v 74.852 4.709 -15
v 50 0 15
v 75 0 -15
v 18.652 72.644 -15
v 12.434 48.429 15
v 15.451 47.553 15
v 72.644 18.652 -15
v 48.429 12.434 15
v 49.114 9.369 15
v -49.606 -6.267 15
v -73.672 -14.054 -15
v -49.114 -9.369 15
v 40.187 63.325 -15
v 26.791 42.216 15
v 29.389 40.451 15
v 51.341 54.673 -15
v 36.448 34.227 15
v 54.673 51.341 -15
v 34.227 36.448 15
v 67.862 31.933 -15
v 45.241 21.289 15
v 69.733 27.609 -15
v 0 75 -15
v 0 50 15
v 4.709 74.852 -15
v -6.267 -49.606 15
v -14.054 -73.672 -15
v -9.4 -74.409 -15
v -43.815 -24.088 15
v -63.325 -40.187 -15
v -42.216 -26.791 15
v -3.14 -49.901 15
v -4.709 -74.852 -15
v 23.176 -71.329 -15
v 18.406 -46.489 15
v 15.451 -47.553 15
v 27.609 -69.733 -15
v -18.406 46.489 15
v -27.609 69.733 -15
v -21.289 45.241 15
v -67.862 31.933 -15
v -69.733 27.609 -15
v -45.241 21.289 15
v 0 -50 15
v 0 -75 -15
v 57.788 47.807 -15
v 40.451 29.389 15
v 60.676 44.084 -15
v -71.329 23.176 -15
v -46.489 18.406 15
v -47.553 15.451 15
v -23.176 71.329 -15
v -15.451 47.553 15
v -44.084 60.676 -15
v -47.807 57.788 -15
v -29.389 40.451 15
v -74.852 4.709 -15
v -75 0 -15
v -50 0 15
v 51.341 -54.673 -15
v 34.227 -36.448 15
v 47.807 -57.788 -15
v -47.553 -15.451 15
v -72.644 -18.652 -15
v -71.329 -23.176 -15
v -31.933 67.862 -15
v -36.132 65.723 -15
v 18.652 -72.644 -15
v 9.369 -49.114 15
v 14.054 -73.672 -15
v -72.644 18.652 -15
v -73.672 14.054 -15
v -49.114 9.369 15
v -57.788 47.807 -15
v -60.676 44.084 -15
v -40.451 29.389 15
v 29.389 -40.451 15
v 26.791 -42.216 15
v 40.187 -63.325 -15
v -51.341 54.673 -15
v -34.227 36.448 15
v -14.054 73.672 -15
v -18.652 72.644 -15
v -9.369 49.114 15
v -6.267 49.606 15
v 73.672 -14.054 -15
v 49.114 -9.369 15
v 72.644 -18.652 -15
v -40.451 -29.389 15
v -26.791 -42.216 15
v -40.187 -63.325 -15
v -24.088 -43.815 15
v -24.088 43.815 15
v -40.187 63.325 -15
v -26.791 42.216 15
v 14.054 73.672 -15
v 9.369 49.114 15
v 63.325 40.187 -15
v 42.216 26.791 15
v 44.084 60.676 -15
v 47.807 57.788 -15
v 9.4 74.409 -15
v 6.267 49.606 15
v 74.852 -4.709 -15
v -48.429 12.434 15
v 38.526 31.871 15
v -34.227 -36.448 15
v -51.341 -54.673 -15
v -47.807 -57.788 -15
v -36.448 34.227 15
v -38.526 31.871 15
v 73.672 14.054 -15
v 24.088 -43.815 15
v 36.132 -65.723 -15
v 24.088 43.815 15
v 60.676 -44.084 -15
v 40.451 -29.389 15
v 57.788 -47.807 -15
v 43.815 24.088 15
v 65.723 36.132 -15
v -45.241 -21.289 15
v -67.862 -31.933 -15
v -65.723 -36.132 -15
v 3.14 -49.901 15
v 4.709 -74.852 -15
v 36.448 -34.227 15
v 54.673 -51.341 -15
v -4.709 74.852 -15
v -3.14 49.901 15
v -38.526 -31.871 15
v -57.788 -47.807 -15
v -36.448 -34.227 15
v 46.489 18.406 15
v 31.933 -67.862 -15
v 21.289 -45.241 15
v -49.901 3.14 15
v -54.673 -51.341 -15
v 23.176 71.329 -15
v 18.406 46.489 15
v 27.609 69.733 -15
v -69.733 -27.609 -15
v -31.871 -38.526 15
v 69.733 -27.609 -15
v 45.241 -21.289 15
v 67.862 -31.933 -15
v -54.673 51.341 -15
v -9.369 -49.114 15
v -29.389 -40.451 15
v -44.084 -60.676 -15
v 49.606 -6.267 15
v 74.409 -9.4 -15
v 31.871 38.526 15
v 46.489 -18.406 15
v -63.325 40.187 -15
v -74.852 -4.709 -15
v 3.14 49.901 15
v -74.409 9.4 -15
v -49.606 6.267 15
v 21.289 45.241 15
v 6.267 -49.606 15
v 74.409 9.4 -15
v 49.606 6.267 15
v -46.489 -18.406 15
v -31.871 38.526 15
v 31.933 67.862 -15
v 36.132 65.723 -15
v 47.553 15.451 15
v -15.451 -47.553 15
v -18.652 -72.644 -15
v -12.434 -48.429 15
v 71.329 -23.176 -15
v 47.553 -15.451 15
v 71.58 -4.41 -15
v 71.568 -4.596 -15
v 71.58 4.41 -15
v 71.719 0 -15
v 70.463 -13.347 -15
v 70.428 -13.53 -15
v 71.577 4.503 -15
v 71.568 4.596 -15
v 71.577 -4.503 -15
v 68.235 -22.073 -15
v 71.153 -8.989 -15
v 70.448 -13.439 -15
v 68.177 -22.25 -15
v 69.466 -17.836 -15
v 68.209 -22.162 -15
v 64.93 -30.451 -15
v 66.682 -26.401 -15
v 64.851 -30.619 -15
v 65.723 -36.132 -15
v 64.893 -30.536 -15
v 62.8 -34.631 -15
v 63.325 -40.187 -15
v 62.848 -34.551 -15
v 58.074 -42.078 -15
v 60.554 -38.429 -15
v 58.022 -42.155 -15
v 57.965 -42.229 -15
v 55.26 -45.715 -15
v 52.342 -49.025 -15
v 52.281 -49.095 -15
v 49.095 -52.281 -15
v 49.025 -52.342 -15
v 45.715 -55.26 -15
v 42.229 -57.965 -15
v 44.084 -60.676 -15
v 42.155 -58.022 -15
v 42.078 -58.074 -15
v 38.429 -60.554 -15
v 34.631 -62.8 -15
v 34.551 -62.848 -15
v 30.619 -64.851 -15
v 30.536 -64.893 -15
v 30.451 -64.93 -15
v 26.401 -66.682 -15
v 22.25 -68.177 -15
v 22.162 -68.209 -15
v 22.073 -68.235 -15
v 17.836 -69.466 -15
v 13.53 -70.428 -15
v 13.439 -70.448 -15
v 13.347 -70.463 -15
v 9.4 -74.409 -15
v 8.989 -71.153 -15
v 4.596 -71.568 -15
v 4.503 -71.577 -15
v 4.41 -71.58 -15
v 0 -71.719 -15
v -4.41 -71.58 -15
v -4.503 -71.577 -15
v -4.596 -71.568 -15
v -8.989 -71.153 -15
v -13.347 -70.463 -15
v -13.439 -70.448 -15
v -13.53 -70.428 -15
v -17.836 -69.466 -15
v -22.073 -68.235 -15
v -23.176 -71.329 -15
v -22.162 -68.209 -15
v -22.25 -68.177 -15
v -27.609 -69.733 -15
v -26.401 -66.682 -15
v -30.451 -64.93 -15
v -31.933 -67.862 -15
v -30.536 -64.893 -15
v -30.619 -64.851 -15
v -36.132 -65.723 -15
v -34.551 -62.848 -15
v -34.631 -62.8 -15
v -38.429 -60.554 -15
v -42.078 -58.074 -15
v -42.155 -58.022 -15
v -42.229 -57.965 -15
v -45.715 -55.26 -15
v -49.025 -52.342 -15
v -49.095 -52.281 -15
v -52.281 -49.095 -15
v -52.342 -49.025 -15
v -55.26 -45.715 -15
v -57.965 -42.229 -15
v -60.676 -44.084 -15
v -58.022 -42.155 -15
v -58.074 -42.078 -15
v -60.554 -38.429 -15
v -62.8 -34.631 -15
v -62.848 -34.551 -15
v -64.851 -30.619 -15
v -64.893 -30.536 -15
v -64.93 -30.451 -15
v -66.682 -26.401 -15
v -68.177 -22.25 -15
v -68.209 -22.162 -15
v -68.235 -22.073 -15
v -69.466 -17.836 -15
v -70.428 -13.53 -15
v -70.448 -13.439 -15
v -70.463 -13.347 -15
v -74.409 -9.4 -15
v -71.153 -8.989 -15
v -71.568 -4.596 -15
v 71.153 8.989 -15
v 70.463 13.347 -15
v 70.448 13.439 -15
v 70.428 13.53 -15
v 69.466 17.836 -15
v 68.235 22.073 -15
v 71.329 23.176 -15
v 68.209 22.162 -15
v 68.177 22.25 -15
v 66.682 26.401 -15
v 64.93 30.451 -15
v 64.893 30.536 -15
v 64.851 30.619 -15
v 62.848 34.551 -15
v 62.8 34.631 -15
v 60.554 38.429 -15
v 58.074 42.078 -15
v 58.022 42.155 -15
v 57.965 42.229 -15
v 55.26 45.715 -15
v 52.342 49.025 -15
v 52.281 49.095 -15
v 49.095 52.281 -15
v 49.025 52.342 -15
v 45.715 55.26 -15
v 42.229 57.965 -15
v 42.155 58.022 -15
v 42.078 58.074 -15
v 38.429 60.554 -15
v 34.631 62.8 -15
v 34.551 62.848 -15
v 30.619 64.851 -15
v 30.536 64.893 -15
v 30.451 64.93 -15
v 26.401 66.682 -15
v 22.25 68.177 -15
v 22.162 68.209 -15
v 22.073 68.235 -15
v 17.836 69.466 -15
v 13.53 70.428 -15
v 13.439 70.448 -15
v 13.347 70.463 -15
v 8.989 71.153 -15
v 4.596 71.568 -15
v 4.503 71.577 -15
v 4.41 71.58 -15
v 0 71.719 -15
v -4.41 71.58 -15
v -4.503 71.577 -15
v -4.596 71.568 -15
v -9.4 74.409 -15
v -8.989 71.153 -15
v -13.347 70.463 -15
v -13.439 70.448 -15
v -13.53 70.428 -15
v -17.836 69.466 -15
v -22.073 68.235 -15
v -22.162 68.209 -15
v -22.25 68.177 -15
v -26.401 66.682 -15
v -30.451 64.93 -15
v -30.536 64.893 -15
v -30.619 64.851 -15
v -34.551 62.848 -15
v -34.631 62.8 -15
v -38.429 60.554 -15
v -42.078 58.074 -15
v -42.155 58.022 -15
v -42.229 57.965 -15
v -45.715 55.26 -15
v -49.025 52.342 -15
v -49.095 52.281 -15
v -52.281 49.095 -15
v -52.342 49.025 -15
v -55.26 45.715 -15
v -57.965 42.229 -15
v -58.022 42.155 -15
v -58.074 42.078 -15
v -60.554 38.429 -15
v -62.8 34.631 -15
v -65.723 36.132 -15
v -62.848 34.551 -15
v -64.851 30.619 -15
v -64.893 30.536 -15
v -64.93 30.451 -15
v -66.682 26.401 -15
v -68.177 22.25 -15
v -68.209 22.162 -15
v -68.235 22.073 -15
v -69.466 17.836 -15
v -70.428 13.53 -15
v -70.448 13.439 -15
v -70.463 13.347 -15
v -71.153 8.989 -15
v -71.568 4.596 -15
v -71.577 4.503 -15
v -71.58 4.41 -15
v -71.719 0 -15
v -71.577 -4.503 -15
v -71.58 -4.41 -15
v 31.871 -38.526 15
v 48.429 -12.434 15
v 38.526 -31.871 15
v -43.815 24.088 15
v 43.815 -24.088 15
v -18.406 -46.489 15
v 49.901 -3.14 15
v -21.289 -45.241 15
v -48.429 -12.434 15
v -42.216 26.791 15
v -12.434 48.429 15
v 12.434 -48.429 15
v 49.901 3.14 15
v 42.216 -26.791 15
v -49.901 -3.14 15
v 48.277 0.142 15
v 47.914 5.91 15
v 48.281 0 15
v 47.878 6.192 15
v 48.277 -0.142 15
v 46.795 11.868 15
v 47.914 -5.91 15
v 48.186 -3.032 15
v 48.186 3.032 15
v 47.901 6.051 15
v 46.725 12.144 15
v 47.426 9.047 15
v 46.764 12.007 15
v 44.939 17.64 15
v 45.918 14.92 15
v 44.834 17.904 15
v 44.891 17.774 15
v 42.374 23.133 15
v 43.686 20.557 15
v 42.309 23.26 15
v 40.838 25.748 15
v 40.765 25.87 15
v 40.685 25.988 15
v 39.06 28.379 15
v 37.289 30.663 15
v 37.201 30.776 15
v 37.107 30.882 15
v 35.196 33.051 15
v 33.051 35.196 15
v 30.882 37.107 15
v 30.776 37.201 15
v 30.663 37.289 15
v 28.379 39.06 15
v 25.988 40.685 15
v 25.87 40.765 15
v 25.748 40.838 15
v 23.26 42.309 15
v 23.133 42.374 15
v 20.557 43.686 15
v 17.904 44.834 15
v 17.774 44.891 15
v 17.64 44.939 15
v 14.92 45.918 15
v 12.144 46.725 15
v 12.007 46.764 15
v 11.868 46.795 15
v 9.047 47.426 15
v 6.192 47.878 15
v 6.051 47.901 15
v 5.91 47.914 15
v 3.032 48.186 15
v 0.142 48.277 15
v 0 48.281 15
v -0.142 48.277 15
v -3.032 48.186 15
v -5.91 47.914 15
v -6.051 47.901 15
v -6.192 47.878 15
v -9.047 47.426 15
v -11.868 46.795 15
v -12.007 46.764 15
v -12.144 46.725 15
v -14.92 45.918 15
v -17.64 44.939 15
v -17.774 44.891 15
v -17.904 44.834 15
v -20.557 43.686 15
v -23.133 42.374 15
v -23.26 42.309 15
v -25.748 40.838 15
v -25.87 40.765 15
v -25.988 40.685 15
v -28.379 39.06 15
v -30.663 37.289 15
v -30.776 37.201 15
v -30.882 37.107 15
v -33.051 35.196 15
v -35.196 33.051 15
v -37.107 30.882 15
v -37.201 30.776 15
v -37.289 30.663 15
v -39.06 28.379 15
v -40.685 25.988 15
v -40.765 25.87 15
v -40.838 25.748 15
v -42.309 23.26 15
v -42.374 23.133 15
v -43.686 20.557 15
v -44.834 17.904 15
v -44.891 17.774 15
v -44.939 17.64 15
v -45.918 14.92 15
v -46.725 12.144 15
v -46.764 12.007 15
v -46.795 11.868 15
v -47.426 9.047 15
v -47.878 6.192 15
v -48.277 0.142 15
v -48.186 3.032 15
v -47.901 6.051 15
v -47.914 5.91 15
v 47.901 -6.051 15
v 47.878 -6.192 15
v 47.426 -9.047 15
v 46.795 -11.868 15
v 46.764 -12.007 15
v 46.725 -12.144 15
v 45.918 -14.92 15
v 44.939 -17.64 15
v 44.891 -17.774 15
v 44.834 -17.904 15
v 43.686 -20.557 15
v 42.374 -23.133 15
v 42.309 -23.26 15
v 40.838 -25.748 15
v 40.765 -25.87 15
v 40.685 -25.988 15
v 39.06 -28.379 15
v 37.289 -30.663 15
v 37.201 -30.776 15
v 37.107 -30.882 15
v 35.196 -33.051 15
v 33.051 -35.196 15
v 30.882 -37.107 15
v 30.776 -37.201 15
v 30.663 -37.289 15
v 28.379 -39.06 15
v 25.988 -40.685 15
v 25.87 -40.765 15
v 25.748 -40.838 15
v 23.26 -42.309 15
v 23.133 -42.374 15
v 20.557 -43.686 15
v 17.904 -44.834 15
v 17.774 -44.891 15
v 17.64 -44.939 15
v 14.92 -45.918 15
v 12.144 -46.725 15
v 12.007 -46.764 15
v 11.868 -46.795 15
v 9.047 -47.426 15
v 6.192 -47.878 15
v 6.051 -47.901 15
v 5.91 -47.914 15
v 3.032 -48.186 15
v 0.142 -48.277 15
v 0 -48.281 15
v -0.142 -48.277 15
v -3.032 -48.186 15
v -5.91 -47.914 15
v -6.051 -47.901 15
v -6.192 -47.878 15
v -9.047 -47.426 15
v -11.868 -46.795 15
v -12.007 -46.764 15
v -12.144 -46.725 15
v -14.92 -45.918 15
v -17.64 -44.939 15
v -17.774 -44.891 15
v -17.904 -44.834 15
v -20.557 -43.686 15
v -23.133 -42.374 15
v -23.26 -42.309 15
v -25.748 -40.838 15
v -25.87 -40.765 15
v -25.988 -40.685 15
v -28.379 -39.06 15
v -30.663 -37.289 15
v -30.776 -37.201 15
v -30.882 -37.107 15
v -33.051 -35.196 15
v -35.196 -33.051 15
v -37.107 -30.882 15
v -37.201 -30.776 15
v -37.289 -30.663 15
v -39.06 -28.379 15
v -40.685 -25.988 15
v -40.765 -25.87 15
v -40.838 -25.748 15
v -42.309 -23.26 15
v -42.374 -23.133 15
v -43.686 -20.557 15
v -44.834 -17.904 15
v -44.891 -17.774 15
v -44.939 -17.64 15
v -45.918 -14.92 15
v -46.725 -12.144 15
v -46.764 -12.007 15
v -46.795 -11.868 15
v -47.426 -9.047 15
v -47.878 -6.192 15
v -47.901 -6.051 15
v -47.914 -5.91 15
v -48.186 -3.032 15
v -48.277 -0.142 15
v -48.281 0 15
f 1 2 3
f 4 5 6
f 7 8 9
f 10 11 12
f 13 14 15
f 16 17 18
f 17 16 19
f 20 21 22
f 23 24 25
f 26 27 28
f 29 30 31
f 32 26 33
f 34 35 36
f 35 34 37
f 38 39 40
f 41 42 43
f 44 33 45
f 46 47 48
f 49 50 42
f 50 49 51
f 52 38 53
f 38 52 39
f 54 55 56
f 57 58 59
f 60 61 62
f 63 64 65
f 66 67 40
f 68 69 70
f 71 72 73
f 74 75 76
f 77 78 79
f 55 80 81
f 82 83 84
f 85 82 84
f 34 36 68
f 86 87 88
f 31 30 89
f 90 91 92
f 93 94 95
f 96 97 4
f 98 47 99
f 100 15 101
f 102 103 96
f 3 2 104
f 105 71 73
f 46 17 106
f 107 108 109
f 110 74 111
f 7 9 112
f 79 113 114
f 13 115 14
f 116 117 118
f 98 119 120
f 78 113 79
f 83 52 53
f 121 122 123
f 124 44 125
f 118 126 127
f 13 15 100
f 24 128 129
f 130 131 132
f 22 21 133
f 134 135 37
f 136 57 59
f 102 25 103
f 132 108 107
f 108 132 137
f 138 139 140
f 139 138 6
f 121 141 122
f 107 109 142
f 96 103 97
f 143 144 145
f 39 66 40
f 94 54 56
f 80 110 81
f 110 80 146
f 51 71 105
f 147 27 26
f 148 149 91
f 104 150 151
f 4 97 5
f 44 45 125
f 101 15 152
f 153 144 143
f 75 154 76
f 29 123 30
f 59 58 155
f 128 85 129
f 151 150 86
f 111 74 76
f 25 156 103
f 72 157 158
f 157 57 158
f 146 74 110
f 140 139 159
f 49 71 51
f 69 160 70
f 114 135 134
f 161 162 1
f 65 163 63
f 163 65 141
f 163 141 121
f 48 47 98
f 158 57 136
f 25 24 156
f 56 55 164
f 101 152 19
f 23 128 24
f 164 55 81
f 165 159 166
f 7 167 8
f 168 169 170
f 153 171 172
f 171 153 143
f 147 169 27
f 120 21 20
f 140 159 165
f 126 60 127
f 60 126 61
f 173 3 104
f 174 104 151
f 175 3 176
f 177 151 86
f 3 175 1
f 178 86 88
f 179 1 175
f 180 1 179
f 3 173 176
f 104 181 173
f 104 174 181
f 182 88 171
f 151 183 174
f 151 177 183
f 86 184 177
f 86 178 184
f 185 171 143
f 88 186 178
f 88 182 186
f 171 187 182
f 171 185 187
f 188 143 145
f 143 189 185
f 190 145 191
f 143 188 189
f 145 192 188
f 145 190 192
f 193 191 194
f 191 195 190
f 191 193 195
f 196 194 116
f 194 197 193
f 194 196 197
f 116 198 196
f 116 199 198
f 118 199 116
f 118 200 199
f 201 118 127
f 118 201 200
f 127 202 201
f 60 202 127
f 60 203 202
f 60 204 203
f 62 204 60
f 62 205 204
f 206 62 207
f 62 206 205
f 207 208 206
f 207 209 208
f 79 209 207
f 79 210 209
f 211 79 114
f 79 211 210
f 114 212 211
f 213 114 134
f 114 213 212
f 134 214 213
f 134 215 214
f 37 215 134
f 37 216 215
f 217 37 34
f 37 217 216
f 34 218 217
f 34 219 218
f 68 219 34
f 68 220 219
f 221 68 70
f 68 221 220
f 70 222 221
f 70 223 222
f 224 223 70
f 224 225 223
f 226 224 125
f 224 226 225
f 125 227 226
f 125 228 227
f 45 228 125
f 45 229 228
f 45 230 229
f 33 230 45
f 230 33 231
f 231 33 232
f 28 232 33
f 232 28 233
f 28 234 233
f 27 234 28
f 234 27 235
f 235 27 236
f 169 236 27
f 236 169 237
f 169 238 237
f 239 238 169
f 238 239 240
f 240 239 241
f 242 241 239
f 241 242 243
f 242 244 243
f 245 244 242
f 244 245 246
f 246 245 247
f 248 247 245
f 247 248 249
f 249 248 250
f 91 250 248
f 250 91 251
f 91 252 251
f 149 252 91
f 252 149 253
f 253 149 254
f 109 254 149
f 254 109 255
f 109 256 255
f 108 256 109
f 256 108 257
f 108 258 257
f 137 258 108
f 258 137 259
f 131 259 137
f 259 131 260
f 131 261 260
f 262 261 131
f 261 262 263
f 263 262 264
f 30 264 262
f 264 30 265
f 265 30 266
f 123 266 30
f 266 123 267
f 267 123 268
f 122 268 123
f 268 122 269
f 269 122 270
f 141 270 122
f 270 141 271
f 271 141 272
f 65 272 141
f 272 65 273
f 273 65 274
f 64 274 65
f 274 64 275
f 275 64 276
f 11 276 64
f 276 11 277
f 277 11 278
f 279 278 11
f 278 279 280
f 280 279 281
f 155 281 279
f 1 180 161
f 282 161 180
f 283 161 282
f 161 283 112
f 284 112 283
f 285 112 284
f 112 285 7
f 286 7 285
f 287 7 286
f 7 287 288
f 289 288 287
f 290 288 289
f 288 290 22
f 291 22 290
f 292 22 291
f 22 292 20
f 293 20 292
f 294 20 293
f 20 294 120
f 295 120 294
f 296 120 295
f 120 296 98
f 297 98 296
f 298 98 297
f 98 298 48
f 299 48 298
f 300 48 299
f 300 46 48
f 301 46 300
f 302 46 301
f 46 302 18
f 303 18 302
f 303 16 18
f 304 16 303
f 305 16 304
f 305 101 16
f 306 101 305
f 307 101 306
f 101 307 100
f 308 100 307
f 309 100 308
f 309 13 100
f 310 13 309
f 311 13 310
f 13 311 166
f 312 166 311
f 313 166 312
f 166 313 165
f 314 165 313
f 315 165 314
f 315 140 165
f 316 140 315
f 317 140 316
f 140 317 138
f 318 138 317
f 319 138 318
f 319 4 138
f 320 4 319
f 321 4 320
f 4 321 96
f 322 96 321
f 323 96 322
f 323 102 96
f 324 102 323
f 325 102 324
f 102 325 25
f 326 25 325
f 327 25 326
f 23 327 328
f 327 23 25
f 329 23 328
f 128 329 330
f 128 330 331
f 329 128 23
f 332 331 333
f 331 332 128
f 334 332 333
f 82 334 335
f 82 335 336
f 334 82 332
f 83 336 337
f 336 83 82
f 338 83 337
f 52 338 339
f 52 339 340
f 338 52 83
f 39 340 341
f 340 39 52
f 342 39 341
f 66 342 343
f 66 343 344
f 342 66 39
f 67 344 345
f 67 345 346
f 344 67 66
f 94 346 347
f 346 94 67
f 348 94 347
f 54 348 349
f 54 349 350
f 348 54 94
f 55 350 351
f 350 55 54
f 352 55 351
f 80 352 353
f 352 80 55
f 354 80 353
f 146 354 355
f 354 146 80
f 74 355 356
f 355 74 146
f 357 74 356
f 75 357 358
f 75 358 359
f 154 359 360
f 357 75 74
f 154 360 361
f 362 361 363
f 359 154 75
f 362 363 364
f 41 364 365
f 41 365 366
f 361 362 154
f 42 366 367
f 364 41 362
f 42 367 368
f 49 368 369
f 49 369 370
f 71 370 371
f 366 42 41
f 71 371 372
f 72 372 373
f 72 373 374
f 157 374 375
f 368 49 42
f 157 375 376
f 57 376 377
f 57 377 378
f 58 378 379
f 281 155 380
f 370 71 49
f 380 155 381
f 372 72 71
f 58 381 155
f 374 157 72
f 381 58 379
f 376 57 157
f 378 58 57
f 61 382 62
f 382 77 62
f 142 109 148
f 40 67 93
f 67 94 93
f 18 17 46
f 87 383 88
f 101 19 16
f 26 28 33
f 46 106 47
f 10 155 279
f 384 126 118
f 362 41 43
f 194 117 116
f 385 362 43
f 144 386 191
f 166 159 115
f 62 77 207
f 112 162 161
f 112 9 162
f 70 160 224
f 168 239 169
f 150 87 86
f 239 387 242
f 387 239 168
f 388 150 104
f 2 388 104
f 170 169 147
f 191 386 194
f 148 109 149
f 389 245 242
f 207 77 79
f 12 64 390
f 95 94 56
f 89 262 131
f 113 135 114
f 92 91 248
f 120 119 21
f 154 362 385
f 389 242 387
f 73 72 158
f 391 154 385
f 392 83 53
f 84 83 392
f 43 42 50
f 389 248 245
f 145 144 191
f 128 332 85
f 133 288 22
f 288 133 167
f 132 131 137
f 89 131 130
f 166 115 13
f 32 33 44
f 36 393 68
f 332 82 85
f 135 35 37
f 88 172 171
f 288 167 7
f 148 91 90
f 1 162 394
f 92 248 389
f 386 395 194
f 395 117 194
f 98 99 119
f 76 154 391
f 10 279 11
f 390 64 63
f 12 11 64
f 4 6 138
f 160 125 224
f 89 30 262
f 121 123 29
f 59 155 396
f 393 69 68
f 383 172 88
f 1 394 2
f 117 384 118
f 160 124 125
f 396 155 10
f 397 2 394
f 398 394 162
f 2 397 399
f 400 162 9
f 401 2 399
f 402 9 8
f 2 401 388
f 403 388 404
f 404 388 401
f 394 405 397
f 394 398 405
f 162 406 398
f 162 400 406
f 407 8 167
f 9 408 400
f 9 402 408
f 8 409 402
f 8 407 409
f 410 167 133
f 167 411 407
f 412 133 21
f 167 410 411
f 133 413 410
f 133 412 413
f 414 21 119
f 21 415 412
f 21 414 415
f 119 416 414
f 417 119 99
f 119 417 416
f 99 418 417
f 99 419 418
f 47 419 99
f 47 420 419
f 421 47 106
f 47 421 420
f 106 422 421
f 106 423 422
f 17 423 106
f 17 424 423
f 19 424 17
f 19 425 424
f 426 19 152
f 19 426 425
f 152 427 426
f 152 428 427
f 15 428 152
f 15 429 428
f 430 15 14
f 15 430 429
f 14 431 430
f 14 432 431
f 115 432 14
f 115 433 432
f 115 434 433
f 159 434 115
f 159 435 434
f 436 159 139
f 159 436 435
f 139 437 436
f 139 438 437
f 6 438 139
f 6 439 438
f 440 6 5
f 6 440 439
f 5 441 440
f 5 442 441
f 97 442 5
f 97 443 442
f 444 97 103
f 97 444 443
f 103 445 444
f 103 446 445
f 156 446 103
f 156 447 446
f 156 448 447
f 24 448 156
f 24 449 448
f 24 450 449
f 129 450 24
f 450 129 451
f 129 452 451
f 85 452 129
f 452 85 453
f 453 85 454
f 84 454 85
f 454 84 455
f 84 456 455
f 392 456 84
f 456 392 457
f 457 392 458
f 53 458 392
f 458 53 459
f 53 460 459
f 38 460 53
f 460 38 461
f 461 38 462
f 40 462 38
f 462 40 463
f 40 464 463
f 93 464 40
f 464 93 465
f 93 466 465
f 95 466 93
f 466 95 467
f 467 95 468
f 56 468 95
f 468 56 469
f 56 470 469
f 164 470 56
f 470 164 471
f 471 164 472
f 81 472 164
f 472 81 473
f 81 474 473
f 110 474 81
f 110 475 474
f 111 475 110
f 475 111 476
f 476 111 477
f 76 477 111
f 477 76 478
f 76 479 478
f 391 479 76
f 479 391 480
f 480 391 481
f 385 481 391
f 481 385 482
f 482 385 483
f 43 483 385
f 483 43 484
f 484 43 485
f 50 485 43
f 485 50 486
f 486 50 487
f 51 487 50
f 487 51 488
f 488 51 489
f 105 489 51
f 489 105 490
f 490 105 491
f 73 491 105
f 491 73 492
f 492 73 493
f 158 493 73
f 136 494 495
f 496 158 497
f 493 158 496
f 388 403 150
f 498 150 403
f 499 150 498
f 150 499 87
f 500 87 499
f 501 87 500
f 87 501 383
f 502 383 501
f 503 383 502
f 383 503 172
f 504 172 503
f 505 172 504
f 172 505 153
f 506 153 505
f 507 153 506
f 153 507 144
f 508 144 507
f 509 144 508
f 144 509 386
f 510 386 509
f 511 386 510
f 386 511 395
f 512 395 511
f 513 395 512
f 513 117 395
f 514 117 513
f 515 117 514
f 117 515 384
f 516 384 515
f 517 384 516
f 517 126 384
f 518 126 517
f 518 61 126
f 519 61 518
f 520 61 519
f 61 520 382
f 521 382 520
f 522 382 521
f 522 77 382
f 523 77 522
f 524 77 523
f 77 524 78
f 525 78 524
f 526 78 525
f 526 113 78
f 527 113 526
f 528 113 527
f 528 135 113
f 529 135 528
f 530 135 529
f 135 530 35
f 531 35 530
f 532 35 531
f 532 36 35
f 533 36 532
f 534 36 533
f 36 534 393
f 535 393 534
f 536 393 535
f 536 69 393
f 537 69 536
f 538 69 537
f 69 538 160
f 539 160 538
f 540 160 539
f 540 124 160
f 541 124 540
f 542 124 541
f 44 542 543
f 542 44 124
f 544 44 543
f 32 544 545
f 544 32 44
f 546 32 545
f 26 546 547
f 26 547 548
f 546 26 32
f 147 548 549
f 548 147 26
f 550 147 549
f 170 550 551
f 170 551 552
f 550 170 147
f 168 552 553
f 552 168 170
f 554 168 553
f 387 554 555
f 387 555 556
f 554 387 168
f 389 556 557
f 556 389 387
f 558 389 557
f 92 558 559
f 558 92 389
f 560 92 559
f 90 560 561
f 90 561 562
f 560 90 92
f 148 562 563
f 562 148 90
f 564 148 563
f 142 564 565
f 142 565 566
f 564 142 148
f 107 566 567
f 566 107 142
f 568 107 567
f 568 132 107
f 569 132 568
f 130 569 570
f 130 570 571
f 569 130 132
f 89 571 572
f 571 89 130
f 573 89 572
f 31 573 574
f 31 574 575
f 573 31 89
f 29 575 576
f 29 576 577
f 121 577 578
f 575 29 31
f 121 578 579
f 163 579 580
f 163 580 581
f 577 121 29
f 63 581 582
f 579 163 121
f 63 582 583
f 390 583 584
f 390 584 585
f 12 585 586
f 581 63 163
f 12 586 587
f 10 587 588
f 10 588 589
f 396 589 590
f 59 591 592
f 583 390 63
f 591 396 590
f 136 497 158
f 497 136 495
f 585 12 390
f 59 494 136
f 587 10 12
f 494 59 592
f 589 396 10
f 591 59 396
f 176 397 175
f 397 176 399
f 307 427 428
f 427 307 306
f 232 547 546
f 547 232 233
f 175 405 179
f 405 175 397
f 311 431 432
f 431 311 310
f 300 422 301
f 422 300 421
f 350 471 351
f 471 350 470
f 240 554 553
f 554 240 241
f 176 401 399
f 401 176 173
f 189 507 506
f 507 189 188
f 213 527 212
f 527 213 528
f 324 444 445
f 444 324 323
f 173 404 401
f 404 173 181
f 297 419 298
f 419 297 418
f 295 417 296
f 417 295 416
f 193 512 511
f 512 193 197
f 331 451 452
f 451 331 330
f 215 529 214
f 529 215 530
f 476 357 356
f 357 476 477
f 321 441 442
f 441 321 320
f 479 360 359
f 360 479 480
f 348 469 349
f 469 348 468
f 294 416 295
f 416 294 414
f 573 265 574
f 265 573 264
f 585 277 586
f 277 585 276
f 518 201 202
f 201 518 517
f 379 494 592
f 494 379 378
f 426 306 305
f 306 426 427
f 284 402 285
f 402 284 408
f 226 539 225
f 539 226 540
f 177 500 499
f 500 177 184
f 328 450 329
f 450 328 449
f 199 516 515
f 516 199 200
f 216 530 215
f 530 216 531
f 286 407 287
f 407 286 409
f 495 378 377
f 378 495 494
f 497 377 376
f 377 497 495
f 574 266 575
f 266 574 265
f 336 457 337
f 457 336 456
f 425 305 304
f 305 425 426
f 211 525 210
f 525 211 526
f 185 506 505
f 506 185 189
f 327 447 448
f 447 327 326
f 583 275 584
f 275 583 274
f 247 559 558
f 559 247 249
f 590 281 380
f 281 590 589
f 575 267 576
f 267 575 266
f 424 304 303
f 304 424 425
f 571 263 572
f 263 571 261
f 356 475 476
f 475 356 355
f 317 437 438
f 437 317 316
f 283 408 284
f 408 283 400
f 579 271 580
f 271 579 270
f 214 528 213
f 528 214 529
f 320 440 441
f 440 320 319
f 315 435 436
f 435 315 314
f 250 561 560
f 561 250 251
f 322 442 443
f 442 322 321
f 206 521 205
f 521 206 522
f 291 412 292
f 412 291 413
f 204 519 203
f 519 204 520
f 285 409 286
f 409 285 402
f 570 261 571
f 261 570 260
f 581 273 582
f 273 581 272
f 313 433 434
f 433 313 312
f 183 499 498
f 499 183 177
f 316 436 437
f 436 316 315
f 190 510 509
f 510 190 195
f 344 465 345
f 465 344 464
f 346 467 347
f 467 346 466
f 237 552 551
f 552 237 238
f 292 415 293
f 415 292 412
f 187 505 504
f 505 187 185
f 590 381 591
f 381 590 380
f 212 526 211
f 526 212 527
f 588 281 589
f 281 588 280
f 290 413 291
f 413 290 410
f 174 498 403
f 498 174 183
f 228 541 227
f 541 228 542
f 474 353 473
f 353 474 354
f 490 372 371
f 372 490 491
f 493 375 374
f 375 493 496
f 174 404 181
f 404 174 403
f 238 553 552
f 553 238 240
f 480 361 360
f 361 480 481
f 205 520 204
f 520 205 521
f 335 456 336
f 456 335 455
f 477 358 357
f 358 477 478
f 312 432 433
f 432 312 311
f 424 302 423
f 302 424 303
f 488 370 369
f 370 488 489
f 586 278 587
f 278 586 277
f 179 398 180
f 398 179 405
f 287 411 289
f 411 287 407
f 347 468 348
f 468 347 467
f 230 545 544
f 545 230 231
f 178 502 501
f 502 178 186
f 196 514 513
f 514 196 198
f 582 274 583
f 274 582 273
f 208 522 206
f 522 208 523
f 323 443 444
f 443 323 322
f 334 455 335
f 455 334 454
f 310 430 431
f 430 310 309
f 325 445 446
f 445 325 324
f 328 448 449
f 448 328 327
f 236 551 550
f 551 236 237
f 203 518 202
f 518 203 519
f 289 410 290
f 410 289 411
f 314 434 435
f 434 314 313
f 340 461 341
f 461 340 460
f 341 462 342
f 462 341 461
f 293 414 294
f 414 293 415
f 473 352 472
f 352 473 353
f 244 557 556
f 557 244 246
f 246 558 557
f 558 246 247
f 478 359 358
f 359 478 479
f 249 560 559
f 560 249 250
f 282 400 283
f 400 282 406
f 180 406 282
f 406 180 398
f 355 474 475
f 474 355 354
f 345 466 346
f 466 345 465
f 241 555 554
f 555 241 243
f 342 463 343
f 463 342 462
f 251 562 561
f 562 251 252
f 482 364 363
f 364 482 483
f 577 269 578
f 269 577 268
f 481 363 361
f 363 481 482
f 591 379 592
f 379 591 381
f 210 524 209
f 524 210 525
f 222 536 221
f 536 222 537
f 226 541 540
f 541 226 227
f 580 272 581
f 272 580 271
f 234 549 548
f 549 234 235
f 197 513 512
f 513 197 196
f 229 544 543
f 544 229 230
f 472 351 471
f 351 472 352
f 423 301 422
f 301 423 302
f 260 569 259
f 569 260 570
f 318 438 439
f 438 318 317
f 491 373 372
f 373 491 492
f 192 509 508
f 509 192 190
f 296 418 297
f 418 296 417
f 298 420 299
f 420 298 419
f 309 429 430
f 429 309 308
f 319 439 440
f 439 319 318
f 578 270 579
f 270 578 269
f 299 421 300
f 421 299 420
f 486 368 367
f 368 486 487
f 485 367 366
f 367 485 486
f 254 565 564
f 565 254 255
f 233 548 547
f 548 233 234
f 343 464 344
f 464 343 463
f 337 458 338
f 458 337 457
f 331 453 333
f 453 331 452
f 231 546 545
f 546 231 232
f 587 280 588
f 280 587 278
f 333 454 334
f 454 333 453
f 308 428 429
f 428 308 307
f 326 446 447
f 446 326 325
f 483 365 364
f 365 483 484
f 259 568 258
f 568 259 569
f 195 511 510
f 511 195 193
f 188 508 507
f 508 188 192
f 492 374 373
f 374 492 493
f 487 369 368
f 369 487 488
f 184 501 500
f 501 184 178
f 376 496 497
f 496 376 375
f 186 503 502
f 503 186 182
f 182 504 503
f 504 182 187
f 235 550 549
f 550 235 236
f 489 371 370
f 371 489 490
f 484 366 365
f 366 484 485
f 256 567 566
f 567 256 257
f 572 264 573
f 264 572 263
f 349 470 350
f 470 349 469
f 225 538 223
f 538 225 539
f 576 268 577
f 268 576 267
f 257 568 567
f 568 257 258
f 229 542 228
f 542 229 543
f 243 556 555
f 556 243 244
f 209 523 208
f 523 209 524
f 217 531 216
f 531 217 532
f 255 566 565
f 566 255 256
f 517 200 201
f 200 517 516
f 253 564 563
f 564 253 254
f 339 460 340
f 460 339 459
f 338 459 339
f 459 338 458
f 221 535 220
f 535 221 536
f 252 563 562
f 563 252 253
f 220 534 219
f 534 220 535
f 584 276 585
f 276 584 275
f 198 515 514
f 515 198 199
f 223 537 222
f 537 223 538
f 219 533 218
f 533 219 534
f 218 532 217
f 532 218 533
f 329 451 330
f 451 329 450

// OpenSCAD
/***********************************************************************
Name ......... : exerciseBallStand.scad
Description....: Exercise Ball Stand
Author ....... : Garrett Melenka
Version ...... : V1.0 2016/11/11
Licence ...... : GPL
***********************************************************************/

//Max diameter at base of stand
maxDiameter = 150;

//Min diameter at top of stand
minDiameter = 100;
//Height of stand
height = 30;

//Thickness of stand
thickness = 5;

//Number of facets of circular features
facets = 100;

module ballStand()
{
    difference(){
    cylinder(r1=maxDiameter*0.5,r2=minDiameter*0.5, h=height, center = true, $fn = facets);
    
    cylinder(r1=maxDiameter*0.5 - thickness*0.5,r2 = minDiameter*0.5-thickness*0.5,  h = height+2, center = true, $fn = facets);
    }
}


ballStand();
